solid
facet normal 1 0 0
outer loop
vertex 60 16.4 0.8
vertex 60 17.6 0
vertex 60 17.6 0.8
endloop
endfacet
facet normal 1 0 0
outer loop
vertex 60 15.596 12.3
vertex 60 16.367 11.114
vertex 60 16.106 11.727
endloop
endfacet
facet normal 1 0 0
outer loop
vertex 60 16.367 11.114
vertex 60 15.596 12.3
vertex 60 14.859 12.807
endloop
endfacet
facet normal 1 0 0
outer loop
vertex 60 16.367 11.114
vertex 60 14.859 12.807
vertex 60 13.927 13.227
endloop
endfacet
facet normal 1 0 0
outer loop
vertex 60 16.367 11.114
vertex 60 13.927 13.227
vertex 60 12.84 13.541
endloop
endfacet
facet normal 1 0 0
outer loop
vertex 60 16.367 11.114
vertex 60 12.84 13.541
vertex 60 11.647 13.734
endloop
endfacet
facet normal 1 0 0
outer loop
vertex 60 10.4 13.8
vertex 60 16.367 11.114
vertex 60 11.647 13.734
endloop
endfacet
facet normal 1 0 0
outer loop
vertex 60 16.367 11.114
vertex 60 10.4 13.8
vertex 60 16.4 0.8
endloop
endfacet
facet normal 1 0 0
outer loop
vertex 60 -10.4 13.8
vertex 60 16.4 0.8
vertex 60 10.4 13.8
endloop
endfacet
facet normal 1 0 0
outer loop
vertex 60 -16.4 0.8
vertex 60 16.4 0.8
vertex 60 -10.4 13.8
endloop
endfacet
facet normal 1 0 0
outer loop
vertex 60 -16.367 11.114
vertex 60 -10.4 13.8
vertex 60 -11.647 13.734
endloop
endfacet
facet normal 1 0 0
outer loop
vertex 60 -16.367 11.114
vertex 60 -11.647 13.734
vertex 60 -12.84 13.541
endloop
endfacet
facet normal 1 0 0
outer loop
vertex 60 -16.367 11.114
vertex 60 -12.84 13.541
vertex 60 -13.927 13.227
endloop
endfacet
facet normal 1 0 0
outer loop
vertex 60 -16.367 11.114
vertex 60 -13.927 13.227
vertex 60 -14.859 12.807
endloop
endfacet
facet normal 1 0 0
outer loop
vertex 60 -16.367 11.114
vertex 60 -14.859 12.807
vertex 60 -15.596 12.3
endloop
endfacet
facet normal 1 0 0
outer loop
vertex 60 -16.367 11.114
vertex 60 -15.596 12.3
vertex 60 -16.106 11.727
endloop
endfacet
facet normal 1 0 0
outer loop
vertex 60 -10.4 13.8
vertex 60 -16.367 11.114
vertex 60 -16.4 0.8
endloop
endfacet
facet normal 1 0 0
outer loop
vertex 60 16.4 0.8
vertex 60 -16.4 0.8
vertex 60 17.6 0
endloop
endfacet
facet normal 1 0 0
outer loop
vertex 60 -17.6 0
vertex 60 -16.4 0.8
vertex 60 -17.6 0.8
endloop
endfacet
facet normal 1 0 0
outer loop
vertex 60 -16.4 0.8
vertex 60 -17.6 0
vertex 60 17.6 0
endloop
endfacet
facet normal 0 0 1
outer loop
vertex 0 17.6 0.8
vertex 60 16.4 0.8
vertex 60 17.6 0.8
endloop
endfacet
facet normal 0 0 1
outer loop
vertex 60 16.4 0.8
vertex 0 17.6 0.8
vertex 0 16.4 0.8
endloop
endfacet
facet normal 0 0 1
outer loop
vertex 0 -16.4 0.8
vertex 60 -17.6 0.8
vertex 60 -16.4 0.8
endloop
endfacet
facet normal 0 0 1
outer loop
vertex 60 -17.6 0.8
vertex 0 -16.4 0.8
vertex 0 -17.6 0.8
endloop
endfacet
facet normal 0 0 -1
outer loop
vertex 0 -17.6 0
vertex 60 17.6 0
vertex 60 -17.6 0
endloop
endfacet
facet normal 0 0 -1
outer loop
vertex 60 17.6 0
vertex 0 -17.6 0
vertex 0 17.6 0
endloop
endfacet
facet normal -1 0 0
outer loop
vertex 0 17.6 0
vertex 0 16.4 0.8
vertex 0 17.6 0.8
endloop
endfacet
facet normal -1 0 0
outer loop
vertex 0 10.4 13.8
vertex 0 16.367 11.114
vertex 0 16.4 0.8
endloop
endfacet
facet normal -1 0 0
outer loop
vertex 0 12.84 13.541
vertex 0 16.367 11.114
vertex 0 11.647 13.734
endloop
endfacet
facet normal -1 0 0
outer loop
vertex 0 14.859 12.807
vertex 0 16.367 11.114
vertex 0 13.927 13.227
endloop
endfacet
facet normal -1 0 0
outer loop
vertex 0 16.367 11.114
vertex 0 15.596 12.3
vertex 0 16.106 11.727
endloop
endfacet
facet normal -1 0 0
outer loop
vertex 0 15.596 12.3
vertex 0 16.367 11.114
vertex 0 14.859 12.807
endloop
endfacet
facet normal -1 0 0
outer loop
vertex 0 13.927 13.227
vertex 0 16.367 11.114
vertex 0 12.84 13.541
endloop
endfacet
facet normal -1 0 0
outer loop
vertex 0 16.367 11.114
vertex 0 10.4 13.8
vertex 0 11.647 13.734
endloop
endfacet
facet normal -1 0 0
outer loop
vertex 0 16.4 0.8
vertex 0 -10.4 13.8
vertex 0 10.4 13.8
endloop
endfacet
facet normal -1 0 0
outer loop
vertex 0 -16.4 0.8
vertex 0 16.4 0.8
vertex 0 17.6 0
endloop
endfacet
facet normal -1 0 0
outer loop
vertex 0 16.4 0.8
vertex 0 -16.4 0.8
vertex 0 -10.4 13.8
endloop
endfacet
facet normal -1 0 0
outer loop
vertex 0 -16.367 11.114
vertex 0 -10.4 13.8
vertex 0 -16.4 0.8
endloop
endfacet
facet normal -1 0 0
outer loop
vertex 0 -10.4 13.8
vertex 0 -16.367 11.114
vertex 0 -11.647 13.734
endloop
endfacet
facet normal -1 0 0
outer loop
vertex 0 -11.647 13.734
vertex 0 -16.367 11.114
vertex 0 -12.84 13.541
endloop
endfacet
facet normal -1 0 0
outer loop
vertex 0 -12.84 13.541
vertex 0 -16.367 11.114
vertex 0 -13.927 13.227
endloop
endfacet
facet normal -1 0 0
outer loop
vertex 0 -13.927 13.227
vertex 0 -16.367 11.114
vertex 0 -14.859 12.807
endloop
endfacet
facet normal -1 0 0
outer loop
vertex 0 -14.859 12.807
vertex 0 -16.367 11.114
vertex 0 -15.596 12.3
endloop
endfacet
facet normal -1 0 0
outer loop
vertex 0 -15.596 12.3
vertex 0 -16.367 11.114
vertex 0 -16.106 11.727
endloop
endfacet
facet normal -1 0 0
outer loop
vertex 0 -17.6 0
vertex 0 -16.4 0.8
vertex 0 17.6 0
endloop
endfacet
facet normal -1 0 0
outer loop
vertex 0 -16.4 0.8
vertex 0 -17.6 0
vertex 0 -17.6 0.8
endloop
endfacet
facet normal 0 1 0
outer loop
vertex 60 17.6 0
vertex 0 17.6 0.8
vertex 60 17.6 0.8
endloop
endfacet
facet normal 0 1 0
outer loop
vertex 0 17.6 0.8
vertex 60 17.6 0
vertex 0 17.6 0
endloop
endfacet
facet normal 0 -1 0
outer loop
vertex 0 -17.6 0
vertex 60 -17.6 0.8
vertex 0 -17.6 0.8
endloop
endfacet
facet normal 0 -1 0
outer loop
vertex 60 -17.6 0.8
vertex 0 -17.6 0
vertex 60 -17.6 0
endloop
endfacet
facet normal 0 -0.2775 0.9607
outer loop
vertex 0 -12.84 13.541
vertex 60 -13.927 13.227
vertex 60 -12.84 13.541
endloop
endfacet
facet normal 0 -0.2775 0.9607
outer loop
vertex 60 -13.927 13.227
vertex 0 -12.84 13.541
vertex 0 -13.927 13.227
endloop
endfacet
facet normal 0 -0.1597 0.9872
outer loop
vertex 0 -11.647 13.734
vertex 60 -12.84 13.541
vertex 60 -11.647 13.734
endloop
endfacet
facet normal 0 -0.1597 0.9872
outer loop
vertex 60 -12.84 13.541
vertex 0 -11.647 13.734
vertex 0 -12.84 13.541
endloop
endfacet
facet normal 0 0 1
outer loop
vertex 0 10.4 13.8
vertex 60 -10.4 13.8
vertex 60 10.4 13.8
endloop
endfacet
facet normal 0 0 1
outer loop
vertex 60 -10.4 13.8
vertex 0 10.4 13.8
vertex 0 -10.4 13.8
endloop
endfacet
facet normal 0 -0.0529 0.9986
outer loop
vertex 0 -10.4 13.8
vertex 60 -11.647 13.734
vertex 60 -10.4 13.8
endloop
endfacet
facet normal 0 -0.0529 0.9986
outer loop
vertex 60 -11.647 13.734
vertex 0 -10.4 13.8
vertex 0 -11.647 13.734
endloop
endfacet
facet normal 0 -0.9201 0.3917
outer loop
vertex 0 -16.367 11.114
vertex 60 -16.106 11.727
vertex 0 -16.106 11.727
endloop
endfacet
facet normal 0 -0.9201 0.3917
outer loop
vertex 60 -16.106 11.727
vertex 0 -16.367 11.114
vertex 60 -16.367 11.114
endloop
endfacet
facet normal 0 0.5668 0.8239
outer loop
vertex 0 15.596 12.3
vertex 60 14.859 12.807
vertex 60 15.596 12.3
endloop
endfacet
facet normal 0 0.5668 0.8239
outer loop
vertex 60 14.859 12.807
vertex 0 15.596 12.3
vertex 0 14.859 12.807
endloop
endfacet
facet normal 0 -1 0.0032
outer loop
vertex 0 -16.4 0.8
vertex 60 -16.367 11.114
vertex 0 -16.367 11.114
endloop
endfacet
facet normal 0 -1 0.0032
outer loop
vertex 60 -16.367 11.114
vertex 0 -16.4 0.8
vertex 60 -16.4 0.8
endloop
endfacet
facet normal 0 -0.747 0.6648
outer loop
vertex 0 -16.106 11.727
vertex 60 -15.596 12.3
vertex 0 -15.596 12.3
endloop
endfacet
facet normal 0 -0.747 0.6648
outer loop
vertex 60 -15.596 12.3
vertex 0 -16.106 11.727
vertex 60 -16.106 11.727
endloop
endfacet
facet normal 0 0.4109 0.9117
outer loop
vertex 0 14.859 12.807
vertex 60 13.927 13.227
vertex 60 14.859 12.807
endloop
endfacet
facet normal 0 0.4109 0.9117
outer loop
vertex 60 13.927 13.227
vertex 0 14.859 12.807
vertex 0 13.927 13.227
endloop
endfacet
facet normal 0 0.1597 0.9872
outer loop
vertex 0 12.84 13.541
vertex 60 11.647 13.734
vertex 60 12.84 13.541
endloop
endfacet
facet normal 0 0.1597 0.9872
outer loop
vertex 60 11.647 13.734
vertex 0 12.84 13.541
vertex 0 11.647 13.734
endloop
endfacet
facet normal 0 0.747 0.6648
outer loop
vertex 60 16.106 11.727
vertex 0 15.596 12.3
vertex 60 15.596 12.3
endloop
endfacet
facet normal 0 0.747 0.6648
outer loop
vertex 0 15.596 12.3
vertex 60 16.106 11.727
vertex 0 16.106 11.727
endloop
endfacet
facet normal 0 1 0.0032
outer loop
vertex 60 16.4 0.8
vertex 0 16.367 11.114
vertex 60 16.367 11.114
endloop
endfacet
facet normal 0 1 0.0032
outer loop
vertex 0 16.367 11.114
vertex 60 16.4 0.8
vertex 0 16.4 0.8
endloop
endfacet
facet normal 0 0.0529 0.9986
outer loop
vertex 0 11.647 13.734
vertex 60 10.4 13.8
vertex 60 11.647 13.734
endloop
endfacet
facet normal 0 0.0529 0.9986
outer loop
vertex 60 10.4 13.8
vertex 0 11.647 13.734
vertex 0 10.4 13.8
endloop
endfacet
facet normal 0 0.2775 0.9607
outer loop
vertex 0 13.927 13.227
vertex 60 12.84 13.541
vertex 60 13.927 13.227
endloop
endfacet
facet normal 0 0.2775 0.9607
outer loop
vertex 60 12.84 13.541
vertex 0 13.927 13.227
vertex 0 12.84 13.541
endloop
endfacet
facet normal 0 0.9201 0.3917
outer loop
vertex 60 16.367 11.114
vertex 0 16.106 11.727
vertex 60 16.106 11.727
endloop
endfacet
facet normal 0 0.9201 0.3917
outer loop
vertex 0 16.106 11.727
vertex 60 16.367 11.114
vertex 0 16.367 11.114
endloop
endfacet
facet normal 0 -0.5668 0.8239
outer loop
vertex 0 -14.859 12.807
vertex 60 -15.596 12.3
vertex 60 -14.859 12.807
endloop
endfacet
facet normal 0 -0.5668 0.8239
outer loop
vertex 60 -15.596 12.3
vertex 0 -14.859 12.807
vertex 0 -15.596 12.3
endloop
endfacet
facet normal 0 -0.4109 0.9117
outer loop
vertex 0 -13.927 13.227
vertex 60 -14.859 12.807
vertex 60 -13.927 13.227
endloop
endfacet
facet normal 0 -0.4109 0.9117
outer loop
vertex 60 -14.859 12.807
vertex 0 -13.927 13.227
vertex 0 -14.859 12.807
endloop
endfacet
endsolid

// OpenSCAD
cableDuct(l=60);

module cableDuct(l=30) {
    translate([0, -35.2/2, 0]) cube([l, 35.2, 0.8]);
    hull() {
      translate([0, -32.8/2, 0]) cube([l, 32.8, 0.8]);
      translate([0, -32.8/2+6, 10.8]) rotate([0, 90, 0]) scale([1, 2, 1]) cylinder(r=3, h=l, $fn=30);
      translate([0, 32.8/2-6, 10.8]) rotate([0, 90, 0]) scale([1, 2, 1]) cylinder(r=3, h=l, $fn=30);
    }
}
